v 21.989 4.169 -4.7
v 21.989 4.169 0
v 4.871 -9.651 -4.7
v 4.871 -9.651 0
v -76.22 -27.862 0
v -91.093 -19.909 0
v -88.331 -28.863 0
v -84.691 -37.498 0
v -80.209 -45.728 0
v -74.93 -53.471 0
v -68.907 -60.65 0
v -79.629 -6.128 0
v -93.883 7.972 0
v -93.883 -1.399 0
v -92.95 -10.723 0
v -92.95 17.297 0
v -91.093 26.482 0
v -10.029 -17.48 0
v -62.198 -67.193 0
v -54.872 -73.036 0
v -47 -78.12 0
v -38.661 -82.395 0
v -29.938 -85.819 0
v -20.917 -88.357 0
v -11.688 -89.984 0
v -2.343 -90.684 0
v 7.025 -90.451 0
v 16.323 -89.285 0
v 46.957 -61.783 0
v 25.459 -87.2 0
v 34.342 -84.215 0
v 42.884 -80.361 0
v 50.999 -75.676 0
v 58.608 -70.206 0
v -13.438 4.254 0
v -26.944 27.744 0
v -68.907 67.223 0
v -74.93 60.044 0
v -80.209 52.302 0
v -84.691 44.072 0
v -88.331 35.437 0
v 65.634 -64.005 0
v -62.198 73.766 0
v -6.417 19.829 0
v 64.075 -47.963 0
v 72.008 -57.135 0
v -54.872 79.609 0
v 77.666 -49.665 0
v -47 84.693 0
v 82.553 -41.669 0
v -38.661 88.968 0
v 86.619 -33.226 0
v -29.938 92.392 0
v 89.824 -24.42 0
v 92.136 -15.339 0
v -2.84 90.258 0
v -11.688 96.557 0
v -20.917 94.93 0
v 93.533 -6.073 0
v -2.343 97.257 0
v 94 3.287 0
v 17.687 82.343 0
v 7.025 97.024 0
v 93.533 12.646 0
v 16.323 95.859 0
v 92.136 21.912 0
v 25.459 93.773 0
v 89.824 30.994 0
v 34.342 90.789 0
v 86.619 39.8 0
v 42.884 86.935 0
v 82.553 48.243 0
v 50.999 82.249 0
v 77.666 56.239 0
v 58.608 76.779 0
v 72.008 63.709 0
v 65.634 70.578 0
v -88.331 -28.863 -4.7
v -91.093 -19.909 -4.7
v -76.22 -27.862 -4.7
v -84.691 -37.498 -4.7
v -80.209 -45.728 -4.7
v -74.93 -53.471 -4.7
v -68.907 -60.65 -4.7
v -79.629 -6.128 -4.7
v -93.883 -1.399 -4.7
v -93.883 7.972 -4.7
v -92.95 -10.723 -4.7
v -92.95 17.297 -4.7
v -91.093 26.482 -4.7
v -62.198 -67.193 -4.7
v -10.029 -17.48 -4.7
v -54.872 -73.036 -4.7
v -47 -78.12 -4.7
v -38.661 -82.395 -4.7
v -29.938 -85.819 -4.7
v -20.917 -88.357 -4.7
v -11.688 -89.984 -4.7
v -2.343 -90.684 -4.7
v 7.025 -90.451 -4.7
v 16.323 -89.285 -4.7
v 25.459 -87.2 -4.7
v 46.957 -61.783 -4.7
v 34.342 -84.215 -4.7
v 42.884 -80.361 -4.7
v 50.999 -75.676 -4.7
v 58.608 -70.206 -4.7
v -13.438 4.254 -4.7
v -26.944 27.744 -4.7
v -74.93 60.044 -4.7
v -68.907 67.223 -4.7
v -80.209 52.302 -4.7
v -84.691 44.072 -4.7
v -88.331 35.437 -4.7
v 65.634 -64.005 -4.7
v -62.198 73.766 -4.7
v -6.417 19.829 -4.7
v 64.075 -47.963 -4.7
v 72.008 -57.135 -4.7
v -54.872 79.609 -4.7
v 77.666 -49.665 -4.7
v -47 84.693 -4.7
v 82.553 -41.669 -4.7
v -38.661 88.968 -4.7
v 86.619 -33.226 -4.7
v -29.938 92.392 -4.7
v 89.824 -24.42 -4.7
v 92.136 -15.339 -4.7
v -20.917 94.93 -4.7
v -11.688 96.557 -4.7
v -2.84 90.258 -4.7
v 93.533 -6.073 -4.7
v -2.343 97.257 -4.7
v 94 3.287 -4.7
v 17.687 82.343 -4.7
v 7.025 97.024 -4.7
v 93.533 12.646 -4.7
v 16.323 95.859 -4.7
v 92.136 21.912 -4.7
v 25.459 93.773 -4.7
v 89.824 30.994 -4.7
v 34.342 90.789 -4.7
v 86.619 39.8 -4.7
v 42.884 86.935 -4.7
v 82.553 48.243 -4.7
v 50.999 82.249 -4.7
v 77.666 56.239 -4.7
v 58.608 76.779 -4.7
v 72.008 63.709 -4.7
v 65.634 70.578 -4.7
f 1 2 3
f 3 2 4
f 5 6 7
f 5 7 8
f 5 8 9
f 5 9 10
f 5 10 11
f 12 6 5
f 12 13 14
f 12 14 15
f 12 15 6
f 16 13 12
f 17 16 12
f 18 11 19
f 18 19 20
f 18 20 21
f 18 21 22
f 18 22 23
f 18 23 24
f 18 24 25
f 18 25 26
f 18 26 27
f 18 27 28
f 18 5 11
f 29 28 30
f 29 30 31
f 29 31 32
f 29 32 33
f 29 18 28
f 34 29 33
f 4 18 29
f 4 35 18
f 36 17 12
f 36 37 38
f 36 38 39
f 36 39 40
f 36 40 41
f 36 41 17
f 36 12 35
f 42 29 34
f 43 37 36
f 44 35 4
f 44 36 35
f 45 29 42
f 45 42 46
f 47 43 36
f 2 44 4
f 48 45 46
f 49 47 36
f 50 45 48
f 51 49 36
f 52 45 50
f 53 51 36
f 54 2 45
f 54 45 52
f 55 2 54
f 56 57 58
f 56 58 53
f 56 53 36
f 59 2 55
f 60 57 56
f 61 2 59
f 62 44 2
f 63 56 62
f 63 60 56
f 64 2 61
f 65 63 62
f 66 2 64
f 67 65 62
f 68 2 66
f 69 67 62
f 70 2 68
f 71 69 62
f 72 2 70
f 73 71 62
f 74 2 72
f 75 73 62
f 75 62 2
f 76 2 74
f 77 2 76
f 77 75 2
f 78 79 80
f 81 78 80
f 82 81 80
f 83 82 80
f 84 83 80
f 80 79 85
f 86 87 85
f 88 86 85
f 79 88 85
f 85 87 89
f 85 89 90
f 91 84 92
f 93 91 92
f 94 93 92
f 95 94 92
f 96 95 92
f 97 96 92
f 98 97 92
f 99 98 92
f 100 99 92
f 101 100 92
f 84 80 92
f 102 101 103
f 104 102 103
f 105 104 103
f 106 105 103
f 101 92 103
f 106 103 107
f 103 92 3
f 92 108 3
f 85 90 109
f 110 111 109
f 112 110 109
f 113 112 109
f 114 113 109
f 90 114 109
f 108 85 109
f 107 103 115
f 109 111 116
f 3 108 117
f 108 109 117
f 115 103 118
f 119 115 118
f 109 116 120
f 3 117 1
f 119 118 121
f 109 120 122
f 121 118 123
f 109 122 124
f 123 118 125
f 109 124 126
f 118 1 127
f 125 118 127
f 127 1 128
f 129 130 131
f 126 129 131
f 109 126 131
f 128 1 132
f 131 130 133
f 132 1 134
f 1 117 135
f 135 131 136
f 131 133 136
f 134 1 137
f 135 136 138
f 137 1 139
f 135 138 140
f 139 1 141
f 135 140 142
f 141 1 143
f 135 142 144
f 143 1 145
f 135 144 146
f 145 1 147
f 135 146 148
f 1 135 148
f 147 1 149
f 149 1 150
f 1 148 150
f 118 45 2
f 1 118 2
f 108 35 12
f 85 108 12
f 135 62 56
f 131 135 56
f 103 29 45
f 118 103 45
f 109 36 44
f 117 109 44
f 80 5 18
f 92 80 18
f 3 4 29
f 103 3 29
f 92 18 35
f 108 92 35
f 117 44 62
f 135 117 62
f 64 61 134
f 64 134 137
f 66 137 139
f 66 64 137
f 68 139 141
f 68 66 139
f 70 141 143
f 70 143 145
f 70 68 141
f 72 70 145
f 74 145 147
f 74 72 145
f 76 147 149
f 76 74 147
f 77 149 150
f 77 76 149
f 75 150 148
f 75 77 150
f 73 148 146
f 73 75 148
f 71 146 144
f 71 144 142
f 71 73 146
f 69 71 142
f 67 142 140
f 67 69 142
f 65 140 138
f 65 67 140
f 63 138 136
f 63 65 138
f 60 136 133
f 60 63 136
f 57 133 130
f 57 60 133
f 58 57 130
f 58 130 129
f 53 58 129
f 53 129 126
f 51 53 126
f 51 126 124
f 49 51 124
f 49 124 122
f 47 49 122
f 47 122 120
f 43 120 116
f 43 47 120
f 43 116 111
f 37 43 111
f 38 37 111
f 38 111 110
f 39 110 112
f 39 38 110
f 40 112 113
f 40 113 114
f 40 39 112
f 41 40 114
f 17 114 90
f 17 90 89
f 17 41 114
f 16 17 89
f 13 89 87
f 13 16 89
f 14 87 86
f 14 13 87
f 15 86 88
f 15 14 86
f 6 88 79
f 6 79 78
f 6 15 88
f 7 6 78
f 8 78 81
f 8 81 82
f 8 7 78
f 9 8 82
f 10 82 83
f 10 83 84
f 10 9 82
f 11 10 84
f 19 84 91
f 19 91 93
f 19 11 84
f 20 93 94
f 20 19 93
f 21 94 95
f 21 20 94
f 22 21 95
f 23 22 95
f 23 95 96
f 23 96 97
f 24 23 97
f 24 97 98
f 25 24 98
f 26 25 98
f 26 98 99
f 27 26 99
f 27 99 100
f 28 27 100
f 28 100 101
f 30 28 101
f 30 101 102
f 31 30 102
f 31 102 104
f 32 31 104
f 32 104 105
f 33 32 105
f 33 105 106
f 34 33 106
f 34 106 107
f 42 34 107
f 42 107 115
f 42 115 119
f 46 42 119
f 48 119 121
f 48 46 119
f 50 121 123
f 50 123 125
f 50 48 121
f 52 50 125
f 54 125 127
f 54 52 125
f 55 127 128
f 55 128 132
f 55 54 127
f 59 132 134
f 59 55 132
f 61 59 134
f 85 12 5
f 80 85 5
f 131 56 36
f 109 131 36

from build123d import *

# Parameters (mm, degrees)
F0_R     = 94
F2_DEPTH = 4.7
F5_DEPTH = 4.8


with BuildPart() as f2:
    # F0 (on Top) → F2 (new body)
    with BuildSketch(Plane.XY):
        with Locations((0, 3.286633)):
            Circle(F0_R)
    extrude(amount=-F2_DEPTH)

    # F1 (on Top) + F3 (on Top) + F4 (on Top) → F5 (cut)
    with BuildSketch(Plane.XY):
        Polygon((21.988586, 4.168563), (4.870629, -9.650827), (46.956953, -61.782787), (64.07491, -47.963397), align=None)
    with BuildSketch(Plane.XY):
        Polygon((-26.944155, 27.743882), (-6.417233, 19.828992), (17.687206, 82.342798), (-2.839715, 90.257689), align=None)
    with BuildSketch(Plane.XY):
        Polygon((-10.029213, -17.480458), (-13.438177, 4.253823), (-79.628941, -6.128023), (-76.219977, -27.862304), align=None)
    extrude(amount=-F5_DEPTH, mode=Mode.SUBTRACT)


solid = f2.part
